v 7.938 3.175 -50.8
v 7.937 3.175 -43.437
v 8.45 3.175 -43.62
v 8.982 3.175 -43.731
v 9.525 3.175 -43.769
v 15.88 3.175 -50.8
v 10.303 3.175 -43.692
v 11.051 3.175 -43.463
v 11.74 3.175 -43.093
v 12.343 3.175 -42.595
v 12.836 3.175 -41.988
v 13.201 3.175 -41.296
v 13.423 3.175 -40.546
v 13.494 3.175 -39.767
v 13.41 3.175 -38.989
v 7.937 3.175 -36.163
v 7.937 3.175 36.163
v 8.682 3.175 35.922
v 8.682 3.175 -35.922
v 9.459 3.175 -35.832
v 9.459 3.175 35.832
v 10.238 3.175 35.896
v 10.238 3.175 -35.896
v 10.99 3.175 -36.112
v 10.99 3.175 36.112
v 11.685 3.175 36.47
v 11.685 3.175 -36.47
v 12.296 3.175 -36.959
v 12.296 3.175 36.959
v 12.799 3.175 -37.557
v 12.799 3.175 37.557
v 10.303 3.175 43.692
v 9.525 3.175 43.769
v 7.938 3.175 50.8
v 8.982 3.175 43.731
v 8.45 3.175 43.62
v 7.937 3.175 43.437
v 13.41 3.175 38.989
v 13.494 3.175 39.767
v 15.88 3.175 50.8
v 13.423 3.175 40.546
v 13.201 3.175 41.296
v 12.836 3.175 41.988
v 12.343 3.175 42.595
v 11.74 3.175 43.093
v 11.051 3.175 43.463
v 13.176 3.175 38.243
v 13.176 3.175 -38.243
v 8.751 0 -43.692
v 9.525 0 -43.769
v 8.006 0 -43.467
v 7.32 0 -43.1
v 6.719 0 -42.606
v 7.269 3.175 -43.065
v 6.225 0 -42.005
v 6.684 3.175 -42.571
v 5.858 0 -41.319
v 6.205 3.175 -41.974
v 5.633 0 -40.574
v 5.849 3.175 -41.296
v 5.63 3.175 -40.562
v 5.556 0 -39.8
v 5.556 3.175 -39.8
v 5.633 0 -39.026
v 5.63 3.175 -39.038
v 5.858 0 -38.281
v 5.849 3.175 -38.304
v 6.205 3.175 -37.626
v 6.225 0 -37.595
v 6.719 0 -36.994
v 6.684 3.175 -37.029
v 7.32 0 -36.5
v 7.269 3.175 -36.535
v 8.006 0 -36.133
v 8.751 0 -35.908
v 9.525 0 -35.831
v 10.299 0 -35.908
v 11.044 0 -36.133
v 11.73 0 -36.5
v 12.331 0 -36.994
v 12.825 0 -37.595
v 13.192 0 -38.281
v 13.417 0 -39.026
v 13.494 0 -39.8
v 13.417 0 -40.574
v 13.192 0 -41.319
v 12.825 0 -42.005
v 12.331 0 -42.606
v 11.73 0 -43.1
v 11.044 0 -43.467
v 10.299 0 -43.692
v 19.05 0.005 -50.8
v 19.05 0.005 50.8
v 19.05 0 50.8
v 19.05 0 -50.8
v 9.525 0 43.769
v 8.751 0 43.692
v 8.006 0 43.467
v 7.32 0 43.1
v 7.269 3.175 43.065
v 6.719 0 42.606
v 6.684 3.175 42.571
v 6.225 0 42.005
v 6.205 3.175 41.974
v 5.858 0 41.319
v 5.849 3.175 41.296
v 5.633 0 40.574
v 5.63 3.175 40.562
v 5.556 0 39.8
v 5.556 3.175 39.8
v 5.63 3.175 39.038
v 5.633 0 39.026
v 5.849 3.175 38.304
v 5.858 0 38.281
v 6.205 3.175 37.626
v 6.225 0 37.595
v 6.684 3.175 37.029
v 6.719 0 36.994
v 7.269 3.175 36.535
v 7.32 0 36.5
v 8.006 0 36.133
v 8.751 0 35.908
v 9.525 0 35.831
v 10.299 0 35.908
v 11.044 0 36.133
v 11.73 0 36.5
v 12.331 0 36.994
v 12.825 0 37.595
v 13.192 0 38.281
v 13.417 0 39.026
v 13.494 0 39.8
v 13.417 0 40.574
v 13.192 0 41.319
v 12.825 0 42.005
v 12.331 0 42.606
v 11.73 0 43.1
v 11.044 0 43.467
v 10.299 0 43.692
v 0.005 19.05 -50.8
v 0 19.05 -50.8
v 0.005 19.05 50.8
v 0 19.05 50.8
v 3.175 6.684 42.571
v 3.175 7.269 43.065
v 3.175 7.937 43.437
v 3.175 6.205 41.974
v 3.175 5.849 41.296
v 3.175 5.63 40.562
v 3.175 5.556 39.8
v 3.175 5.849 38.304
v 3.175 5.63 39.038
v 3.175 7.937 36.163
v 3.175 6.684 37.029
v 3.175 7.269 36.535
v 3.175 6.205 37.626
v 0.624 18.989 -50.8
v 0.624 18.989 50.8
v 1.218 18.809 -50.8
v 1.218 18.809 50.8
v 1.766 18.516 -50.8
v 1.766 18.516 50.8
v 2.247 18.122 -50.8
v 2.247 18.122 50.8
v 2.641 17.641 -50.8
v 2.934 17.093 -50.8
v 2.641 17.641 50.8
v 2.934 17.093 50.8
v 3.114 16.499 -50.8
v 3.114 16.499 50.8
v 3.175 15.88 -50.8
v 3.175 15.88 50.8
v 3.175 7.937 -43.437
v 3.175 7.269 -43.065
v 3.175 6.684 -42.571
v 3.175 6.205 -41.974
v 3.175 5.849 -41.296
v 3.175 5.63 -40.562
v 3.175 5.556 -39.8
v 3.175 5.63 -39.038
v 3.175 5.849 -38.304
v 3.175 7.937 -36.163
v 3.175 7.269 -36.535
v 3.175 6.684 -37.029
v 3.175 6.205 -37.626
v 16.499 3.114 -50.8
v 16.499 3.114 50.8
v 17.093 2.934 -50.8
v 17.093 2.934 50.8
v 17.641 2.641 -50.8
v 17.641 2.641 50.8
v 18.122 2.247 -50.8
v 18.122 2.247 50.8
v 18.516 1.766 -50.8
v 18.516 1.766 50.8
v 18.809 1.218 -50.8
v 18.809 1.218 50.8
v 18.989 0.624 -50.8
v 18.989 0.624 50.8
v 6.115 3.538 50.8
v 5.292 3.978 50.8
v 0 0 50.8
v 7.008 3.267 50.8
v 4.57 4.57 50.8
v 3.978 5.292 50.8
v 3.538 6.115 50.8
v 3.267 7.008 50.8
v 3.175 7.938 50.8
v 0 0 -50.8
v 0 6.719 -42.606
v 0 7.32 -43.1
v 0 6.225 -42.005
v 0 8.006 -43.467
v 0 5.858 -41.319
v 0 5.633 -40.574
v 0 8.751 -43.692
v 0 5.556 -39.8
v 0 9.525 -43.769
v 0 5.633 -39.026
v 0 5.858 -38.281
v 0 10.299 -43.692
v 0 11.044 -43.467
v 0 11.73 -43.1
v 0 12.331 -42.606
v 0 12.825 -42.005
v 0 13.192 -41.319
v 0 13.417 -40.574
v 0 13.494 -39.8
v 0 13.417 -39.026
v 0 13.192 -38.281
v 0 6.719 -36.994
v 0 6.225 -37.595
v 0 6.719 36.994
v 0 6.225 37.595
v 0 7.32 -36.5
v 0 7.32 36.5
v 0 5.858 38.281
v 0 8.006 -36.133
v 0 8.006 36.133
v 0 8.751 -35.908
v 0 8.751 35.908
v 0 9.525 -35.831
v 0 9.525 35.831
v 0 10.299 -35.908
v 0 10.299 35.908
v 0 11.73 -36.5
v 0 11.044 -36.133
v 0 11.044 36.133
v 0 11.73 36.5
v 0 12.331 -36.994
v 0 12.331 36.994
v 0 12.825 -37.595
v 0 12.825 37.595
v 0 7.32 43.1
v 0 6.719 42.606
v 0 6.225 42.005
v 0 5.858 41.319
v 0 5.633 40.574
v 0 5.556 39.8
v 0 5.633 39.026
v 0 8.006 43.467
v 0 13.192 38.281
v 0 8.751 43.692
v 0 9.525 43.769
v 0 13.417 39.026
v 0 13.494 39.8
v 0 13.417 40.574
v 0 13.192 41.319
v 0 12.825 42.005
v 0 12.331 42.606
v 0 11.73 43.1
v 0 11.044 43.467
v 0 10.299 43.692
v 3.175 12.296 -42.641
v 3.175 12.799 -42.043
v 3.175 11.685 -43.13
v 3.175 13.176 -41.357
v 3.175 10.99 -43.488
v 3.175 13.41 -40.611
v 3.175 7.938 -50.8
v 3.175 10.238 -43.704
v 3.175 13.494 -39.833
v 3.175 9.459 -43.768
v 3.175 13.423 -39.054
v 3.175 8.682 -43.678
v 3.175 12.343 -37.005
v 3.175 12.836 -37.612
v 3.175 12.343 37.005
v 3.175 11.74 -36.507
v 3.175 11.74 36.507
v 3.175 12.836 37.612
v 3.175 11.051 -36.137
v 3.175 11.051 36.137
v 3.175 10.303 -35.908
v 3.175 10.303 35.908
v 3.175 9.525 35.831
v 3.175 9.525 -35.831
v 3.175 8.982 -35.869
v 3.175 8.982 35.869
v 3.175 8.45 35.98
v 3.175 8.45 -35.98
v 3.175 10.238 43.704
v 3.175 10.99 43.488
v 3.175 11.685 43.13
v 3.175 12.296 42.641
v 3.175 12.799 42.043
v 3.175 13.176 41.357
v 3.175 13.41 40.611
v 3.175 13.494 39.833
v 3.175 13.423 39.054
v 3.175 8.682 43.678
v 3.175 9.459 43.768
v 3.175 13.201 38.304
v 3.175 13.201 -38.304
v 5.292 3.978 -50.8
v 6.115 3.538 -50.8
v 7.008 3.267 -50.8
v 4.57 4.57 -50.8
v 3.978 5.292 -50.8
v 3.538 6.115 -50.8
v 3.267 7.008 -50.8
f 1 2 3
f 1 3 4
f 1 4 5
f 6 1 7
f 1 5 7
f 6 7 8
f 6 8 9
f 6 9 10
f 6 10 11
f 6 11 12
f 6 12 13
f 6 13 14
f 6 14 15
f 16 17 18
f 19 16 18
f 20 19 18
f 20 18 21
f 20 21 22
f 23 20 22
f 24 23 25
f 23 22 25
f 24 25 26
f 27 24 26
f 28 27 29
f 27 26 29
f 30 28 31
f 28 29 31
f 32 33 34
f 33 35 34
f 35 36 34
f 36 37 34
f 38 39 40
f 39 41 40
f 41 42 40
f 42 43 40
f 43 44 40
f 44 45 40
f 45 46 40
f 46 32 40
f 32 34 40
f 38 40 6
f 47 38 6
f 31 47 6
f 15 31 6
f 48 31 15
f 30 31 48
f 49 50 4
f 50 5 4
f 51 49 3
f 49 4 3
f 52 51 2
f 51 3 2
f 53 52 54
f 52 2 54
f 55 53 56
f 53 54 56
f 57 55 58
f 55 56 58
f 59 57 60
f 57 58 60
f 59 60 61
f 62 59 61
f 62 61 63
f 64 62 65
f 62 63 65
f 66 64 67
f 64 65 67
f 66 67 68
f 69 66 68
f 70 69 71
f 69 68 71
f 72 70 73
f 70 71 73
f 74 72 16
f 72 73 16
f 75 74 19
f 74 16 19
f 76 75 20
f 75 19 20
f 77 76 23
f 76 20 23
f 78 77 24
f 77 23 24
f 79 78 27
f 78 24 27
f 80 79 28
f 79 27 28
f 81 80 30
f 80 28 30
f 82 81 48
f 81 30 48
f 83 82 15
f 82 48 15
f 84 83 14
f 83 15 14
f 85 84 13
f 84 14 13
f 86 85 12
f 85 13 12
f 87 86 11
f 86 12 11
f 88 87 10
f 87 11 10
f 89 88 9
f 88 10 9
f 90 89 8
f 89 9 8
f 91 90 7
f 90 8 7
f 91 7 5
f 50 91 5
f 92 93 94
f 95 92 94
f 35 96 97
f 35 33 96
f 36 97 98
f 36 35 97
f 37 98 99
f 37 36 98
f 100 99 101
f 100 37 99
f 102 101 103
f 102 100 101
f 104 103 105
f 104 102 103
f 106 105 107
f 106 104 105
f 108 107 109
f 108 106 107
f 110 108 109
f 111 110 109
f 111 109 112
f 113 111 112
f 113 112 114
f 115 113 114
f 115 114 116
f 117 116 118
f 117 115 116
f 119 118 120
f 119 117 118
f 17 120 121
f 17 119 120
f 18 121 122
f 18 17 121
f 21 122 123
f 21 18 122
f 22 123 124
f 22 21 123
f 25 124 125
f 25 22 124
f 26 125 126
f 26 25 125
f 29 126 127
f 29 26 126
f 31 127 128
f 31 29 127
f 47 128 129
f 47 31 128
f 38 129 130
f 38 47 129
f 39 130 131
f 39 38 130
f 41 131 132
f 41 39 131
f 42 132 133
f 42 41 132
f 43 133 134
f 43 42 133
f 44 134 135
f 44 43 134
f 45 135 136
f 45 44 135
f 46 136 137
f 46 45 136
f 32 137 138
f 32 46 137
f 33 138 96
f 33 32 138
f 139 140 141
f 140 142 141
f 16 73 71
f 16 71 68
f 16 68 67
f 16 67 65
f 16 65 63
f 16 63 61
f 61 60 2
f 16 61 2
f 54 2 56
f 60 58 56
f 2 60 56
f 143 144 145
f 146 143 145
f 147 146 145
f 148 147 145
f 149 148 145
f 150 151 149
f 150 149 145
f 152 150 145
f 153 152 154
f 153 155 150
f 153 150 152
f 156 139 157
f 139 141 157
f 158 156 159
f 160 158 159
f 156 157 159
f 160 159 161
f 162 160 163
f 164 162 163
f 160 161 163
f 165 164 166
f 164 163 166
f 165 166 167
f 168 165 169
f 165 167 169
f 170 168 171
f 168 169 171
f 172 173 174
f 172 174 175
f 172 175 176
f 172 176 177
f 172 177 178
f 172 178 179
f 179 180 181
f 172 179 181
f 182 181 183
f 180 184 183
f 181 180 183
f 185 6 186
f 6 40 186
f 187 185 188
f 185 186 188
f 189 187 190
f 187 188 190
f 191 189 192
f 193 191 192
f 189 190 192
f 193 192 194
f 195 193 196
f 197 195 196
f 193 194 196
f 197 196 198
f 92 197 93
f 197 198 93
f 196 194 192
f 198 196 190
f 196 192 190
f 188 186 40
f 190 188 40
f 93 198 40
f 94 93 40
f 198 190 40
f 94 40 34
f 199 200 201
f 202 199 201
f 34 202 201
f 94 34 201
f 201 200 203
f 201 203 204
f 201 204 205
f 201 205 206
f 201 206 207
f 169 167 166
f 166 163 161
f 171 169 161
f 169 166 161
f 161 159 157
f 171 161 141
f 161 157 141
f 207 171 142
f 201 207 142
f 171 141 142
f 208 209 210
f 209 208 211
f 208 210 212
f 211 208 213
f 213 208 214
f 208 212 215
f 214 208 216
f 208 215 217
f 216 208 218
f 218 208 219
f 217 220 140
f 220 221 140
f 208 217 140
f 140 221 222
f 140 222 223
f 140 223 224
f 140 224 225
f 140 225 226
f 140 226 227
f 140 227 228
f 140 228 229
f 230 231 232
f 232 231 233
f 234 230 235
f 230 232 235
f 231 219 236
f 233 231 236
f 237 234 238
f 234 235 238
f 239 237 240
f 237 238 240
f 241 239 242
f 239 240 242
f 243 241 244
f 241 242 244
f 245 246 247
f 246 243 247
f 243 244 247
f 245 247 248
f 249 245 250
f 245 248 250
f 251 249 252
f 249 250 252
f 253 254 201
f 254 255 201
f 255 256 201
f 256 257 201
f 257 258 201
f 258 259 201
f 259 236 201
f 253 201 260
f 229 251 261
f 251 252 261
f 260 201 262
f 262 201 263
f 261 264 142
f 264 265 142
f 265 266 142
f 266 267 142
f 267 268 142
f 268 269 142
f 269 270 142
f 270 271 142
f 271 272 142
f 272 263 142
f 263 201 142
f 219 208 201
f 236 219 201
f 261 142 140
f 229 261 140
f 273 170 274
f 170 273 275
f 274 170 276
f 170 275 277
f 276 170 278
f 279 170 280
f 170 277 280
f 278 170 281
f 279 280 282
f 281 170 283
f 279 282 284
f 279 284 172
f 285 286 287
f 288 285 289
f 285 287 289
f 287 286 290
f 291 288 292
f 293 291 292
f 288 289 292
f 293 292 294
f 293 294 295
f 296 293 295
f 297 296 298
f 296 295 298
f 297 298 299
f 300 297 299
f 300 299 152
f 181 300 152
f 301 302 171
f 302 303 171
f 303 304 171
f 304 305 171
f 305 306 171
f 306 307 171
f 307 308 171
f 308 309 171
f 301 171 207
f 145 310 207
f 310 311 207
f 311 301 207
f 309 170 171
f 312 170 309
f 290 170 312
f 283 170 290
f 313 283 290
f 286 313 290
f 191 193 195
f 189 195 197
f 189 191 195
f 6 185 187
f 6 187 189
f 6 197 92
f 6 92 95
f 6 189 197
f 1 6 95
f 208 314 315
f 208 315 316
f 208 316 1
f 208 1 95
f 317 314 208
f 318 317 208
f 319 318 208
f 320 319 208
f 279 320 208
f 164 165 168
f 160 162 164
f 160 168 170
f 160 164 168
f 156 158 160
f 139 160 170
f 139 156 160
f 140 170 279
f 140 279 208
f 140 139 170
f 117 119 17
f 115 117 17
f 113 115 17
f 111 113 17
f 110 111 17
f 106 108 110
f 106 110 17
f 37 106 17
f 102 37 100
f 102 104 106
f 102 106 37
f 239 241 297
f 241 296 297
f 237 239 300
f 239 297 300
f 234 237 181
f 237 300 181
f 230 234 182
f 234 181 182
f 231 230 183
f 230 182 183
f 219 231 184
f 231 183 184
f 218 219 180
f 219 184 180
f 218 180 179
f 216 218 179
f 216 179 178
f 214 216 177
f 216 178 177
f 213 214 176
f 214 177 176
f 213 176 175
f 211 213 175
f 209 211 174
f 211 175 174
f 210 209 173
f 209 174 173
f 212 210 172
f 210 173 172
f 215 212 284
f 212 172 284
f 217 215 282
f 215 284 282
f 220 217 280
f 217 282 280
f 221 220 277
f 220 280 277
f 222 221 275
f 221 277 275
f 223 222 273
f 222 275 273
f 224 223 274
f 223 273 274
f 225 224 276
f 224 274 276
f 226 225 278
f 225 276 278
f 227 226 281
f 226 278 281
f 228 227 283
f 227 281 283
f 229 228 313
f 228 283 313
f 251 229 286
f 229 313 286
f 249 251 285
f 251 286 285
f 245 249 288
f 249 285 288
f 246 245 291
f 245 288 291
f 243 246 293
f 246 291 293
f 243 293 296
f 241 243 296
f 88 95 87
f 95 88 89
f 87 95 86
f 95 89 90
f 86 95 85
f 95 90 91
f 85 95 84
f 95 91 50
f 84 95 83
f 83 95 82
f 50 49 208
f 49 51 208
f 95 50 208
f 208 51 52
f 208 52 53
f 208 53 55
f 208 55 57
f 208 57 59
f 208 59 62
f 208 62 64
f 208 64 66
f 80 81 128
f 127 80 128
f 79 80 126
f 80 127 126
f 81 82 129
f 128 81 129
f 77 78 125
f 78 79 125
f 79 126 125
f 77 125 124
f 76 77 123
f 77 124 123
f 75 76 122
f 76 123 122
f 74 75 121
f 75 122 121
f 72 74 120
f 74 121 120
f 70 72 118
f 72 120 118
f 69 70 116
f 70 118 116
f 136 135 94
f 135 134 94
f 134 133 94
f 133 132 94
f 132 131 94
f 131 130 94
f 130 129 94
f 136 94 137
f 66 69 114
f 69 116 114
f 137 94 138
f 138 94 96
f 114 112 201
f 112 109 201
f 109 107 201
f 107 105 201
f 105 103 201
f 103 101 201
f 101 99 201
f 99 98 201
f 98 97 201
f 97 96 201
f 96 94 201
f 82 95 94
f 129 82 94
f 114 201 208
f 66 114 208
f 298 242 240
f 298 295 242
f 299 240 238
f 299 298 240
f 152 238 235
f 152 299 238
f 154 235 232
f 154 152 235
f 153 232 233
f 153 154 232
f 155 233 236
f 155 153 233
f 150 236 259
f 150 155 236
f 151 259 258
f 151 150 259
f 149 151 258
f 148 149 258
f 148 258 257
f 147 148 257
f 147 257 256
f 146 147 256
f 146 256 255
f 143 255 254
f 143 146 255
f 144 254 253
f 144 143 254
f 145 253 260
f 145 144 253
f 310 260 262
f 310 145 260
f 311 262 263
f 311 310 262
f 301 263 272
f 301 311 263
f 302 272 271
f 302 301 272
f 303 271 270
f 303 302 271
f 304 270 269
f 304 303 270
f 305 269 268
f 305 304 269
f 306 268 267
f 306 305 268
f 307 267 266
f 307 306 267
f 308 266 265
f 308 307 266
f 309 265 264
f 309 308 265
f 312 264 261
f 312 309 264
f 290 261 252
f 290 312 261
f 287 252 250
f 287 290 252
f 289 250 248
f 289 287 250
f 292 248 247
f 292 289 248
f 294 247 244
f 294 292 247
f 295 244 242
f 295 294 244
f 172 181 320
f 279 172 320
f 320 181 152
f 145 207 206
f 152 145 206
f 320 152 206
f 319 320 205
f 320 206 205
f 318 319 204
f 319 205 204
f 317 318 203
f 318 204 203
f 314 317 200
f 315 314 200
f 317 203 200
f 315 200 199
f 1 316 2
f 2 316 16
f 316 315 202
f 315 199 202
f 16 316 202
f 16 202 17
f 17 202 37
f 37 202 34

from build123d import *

# Parameters (mm, degrees)
BASESTEELANGLE_DEPTH = 50.8


with BuildPart() as part:
    # Sketch1 → BaseSteelAngle (new body, symmetric)
    with BuildSketch(Plane.XY):
        with BuildLine():
            Line((0, 0), (0, 19.05))
            Line((0, 19.05), (0.00508, 19.05))
            ThreePointArc((0.00508, 19.05), (2.246551928, 18.121551928), (3.175, 15.88008))
            Line((3.175, 15.88008), (3.175, 7.9375))
            ThreePointArc((3.175, 7.9375), (4.569903955, 4.569903955), (7.9375, 3.175))
            Line((7.9375, 3.175), (15.88008, 3.175))
            ThreePointArc((15.88008, 3.175), (18.121551928, 2.246551928), (19.05, 0.00508))
            Line((19.05, 0.00508), (19.05, 0))
            Line((19.05, 0), (0, 0))
        make_face()
    extrude(amount=BASESTEELANGLE_DEPTH, both=True)

    # Sketch4 → 5/16 (0.3125) Diameter Hole2 (revolve, cut)
    with BuildSketch(Plane(origin=(9.525, 3.175, 39.8), x_dir=(0, 0, 1), z_dir=(1, 0, 0))):
        Polygon((0, 0), (0, 21.434665582), (3.96875, 19.05), (3.96875, 0), align=None)
    f_5_16_0_3125_diameter_hole2 = revolve(axis=Axis((9.525, 9.525, 39.8), (0, -1, 0)), mode=Mode.SUBTRACT)

    # Mirror1: 5/16 (0.3125) Diameter Hole2 across plane
    add(f_5_16_0_3125_diameter_hole2.mirror(Plane.XY), mode=Mode.SUBTRACT)

    # Sketch6 → 5/16 (0.3125) Diameter Hole3 (revolve, cut)
    with BuildSketch(Plane(origin=(3.175, 9.525, 39.8), x_dir=(0, 0, -1), z_dir=(0, 1, 0))):
        Polygon((0, 0), (0, 21.434665582), (3.96875, 19.05), (3.96875, 0), align=None)
    f_5_16_0_3125_diameter_hole3 = revolve(axis=Axis((9.525, 9.525, 39.8), (-1, 0, 0)), mode=Mode.SUBTRACT)

    # Mirror2: 5/16 (0.3125) Diameter Hole3 across plane
    add(f_5_16_0_3125_diameter_hole3.mirror(Plane.XY), mode=Mode.SUBTRACT)


solid = part.part
